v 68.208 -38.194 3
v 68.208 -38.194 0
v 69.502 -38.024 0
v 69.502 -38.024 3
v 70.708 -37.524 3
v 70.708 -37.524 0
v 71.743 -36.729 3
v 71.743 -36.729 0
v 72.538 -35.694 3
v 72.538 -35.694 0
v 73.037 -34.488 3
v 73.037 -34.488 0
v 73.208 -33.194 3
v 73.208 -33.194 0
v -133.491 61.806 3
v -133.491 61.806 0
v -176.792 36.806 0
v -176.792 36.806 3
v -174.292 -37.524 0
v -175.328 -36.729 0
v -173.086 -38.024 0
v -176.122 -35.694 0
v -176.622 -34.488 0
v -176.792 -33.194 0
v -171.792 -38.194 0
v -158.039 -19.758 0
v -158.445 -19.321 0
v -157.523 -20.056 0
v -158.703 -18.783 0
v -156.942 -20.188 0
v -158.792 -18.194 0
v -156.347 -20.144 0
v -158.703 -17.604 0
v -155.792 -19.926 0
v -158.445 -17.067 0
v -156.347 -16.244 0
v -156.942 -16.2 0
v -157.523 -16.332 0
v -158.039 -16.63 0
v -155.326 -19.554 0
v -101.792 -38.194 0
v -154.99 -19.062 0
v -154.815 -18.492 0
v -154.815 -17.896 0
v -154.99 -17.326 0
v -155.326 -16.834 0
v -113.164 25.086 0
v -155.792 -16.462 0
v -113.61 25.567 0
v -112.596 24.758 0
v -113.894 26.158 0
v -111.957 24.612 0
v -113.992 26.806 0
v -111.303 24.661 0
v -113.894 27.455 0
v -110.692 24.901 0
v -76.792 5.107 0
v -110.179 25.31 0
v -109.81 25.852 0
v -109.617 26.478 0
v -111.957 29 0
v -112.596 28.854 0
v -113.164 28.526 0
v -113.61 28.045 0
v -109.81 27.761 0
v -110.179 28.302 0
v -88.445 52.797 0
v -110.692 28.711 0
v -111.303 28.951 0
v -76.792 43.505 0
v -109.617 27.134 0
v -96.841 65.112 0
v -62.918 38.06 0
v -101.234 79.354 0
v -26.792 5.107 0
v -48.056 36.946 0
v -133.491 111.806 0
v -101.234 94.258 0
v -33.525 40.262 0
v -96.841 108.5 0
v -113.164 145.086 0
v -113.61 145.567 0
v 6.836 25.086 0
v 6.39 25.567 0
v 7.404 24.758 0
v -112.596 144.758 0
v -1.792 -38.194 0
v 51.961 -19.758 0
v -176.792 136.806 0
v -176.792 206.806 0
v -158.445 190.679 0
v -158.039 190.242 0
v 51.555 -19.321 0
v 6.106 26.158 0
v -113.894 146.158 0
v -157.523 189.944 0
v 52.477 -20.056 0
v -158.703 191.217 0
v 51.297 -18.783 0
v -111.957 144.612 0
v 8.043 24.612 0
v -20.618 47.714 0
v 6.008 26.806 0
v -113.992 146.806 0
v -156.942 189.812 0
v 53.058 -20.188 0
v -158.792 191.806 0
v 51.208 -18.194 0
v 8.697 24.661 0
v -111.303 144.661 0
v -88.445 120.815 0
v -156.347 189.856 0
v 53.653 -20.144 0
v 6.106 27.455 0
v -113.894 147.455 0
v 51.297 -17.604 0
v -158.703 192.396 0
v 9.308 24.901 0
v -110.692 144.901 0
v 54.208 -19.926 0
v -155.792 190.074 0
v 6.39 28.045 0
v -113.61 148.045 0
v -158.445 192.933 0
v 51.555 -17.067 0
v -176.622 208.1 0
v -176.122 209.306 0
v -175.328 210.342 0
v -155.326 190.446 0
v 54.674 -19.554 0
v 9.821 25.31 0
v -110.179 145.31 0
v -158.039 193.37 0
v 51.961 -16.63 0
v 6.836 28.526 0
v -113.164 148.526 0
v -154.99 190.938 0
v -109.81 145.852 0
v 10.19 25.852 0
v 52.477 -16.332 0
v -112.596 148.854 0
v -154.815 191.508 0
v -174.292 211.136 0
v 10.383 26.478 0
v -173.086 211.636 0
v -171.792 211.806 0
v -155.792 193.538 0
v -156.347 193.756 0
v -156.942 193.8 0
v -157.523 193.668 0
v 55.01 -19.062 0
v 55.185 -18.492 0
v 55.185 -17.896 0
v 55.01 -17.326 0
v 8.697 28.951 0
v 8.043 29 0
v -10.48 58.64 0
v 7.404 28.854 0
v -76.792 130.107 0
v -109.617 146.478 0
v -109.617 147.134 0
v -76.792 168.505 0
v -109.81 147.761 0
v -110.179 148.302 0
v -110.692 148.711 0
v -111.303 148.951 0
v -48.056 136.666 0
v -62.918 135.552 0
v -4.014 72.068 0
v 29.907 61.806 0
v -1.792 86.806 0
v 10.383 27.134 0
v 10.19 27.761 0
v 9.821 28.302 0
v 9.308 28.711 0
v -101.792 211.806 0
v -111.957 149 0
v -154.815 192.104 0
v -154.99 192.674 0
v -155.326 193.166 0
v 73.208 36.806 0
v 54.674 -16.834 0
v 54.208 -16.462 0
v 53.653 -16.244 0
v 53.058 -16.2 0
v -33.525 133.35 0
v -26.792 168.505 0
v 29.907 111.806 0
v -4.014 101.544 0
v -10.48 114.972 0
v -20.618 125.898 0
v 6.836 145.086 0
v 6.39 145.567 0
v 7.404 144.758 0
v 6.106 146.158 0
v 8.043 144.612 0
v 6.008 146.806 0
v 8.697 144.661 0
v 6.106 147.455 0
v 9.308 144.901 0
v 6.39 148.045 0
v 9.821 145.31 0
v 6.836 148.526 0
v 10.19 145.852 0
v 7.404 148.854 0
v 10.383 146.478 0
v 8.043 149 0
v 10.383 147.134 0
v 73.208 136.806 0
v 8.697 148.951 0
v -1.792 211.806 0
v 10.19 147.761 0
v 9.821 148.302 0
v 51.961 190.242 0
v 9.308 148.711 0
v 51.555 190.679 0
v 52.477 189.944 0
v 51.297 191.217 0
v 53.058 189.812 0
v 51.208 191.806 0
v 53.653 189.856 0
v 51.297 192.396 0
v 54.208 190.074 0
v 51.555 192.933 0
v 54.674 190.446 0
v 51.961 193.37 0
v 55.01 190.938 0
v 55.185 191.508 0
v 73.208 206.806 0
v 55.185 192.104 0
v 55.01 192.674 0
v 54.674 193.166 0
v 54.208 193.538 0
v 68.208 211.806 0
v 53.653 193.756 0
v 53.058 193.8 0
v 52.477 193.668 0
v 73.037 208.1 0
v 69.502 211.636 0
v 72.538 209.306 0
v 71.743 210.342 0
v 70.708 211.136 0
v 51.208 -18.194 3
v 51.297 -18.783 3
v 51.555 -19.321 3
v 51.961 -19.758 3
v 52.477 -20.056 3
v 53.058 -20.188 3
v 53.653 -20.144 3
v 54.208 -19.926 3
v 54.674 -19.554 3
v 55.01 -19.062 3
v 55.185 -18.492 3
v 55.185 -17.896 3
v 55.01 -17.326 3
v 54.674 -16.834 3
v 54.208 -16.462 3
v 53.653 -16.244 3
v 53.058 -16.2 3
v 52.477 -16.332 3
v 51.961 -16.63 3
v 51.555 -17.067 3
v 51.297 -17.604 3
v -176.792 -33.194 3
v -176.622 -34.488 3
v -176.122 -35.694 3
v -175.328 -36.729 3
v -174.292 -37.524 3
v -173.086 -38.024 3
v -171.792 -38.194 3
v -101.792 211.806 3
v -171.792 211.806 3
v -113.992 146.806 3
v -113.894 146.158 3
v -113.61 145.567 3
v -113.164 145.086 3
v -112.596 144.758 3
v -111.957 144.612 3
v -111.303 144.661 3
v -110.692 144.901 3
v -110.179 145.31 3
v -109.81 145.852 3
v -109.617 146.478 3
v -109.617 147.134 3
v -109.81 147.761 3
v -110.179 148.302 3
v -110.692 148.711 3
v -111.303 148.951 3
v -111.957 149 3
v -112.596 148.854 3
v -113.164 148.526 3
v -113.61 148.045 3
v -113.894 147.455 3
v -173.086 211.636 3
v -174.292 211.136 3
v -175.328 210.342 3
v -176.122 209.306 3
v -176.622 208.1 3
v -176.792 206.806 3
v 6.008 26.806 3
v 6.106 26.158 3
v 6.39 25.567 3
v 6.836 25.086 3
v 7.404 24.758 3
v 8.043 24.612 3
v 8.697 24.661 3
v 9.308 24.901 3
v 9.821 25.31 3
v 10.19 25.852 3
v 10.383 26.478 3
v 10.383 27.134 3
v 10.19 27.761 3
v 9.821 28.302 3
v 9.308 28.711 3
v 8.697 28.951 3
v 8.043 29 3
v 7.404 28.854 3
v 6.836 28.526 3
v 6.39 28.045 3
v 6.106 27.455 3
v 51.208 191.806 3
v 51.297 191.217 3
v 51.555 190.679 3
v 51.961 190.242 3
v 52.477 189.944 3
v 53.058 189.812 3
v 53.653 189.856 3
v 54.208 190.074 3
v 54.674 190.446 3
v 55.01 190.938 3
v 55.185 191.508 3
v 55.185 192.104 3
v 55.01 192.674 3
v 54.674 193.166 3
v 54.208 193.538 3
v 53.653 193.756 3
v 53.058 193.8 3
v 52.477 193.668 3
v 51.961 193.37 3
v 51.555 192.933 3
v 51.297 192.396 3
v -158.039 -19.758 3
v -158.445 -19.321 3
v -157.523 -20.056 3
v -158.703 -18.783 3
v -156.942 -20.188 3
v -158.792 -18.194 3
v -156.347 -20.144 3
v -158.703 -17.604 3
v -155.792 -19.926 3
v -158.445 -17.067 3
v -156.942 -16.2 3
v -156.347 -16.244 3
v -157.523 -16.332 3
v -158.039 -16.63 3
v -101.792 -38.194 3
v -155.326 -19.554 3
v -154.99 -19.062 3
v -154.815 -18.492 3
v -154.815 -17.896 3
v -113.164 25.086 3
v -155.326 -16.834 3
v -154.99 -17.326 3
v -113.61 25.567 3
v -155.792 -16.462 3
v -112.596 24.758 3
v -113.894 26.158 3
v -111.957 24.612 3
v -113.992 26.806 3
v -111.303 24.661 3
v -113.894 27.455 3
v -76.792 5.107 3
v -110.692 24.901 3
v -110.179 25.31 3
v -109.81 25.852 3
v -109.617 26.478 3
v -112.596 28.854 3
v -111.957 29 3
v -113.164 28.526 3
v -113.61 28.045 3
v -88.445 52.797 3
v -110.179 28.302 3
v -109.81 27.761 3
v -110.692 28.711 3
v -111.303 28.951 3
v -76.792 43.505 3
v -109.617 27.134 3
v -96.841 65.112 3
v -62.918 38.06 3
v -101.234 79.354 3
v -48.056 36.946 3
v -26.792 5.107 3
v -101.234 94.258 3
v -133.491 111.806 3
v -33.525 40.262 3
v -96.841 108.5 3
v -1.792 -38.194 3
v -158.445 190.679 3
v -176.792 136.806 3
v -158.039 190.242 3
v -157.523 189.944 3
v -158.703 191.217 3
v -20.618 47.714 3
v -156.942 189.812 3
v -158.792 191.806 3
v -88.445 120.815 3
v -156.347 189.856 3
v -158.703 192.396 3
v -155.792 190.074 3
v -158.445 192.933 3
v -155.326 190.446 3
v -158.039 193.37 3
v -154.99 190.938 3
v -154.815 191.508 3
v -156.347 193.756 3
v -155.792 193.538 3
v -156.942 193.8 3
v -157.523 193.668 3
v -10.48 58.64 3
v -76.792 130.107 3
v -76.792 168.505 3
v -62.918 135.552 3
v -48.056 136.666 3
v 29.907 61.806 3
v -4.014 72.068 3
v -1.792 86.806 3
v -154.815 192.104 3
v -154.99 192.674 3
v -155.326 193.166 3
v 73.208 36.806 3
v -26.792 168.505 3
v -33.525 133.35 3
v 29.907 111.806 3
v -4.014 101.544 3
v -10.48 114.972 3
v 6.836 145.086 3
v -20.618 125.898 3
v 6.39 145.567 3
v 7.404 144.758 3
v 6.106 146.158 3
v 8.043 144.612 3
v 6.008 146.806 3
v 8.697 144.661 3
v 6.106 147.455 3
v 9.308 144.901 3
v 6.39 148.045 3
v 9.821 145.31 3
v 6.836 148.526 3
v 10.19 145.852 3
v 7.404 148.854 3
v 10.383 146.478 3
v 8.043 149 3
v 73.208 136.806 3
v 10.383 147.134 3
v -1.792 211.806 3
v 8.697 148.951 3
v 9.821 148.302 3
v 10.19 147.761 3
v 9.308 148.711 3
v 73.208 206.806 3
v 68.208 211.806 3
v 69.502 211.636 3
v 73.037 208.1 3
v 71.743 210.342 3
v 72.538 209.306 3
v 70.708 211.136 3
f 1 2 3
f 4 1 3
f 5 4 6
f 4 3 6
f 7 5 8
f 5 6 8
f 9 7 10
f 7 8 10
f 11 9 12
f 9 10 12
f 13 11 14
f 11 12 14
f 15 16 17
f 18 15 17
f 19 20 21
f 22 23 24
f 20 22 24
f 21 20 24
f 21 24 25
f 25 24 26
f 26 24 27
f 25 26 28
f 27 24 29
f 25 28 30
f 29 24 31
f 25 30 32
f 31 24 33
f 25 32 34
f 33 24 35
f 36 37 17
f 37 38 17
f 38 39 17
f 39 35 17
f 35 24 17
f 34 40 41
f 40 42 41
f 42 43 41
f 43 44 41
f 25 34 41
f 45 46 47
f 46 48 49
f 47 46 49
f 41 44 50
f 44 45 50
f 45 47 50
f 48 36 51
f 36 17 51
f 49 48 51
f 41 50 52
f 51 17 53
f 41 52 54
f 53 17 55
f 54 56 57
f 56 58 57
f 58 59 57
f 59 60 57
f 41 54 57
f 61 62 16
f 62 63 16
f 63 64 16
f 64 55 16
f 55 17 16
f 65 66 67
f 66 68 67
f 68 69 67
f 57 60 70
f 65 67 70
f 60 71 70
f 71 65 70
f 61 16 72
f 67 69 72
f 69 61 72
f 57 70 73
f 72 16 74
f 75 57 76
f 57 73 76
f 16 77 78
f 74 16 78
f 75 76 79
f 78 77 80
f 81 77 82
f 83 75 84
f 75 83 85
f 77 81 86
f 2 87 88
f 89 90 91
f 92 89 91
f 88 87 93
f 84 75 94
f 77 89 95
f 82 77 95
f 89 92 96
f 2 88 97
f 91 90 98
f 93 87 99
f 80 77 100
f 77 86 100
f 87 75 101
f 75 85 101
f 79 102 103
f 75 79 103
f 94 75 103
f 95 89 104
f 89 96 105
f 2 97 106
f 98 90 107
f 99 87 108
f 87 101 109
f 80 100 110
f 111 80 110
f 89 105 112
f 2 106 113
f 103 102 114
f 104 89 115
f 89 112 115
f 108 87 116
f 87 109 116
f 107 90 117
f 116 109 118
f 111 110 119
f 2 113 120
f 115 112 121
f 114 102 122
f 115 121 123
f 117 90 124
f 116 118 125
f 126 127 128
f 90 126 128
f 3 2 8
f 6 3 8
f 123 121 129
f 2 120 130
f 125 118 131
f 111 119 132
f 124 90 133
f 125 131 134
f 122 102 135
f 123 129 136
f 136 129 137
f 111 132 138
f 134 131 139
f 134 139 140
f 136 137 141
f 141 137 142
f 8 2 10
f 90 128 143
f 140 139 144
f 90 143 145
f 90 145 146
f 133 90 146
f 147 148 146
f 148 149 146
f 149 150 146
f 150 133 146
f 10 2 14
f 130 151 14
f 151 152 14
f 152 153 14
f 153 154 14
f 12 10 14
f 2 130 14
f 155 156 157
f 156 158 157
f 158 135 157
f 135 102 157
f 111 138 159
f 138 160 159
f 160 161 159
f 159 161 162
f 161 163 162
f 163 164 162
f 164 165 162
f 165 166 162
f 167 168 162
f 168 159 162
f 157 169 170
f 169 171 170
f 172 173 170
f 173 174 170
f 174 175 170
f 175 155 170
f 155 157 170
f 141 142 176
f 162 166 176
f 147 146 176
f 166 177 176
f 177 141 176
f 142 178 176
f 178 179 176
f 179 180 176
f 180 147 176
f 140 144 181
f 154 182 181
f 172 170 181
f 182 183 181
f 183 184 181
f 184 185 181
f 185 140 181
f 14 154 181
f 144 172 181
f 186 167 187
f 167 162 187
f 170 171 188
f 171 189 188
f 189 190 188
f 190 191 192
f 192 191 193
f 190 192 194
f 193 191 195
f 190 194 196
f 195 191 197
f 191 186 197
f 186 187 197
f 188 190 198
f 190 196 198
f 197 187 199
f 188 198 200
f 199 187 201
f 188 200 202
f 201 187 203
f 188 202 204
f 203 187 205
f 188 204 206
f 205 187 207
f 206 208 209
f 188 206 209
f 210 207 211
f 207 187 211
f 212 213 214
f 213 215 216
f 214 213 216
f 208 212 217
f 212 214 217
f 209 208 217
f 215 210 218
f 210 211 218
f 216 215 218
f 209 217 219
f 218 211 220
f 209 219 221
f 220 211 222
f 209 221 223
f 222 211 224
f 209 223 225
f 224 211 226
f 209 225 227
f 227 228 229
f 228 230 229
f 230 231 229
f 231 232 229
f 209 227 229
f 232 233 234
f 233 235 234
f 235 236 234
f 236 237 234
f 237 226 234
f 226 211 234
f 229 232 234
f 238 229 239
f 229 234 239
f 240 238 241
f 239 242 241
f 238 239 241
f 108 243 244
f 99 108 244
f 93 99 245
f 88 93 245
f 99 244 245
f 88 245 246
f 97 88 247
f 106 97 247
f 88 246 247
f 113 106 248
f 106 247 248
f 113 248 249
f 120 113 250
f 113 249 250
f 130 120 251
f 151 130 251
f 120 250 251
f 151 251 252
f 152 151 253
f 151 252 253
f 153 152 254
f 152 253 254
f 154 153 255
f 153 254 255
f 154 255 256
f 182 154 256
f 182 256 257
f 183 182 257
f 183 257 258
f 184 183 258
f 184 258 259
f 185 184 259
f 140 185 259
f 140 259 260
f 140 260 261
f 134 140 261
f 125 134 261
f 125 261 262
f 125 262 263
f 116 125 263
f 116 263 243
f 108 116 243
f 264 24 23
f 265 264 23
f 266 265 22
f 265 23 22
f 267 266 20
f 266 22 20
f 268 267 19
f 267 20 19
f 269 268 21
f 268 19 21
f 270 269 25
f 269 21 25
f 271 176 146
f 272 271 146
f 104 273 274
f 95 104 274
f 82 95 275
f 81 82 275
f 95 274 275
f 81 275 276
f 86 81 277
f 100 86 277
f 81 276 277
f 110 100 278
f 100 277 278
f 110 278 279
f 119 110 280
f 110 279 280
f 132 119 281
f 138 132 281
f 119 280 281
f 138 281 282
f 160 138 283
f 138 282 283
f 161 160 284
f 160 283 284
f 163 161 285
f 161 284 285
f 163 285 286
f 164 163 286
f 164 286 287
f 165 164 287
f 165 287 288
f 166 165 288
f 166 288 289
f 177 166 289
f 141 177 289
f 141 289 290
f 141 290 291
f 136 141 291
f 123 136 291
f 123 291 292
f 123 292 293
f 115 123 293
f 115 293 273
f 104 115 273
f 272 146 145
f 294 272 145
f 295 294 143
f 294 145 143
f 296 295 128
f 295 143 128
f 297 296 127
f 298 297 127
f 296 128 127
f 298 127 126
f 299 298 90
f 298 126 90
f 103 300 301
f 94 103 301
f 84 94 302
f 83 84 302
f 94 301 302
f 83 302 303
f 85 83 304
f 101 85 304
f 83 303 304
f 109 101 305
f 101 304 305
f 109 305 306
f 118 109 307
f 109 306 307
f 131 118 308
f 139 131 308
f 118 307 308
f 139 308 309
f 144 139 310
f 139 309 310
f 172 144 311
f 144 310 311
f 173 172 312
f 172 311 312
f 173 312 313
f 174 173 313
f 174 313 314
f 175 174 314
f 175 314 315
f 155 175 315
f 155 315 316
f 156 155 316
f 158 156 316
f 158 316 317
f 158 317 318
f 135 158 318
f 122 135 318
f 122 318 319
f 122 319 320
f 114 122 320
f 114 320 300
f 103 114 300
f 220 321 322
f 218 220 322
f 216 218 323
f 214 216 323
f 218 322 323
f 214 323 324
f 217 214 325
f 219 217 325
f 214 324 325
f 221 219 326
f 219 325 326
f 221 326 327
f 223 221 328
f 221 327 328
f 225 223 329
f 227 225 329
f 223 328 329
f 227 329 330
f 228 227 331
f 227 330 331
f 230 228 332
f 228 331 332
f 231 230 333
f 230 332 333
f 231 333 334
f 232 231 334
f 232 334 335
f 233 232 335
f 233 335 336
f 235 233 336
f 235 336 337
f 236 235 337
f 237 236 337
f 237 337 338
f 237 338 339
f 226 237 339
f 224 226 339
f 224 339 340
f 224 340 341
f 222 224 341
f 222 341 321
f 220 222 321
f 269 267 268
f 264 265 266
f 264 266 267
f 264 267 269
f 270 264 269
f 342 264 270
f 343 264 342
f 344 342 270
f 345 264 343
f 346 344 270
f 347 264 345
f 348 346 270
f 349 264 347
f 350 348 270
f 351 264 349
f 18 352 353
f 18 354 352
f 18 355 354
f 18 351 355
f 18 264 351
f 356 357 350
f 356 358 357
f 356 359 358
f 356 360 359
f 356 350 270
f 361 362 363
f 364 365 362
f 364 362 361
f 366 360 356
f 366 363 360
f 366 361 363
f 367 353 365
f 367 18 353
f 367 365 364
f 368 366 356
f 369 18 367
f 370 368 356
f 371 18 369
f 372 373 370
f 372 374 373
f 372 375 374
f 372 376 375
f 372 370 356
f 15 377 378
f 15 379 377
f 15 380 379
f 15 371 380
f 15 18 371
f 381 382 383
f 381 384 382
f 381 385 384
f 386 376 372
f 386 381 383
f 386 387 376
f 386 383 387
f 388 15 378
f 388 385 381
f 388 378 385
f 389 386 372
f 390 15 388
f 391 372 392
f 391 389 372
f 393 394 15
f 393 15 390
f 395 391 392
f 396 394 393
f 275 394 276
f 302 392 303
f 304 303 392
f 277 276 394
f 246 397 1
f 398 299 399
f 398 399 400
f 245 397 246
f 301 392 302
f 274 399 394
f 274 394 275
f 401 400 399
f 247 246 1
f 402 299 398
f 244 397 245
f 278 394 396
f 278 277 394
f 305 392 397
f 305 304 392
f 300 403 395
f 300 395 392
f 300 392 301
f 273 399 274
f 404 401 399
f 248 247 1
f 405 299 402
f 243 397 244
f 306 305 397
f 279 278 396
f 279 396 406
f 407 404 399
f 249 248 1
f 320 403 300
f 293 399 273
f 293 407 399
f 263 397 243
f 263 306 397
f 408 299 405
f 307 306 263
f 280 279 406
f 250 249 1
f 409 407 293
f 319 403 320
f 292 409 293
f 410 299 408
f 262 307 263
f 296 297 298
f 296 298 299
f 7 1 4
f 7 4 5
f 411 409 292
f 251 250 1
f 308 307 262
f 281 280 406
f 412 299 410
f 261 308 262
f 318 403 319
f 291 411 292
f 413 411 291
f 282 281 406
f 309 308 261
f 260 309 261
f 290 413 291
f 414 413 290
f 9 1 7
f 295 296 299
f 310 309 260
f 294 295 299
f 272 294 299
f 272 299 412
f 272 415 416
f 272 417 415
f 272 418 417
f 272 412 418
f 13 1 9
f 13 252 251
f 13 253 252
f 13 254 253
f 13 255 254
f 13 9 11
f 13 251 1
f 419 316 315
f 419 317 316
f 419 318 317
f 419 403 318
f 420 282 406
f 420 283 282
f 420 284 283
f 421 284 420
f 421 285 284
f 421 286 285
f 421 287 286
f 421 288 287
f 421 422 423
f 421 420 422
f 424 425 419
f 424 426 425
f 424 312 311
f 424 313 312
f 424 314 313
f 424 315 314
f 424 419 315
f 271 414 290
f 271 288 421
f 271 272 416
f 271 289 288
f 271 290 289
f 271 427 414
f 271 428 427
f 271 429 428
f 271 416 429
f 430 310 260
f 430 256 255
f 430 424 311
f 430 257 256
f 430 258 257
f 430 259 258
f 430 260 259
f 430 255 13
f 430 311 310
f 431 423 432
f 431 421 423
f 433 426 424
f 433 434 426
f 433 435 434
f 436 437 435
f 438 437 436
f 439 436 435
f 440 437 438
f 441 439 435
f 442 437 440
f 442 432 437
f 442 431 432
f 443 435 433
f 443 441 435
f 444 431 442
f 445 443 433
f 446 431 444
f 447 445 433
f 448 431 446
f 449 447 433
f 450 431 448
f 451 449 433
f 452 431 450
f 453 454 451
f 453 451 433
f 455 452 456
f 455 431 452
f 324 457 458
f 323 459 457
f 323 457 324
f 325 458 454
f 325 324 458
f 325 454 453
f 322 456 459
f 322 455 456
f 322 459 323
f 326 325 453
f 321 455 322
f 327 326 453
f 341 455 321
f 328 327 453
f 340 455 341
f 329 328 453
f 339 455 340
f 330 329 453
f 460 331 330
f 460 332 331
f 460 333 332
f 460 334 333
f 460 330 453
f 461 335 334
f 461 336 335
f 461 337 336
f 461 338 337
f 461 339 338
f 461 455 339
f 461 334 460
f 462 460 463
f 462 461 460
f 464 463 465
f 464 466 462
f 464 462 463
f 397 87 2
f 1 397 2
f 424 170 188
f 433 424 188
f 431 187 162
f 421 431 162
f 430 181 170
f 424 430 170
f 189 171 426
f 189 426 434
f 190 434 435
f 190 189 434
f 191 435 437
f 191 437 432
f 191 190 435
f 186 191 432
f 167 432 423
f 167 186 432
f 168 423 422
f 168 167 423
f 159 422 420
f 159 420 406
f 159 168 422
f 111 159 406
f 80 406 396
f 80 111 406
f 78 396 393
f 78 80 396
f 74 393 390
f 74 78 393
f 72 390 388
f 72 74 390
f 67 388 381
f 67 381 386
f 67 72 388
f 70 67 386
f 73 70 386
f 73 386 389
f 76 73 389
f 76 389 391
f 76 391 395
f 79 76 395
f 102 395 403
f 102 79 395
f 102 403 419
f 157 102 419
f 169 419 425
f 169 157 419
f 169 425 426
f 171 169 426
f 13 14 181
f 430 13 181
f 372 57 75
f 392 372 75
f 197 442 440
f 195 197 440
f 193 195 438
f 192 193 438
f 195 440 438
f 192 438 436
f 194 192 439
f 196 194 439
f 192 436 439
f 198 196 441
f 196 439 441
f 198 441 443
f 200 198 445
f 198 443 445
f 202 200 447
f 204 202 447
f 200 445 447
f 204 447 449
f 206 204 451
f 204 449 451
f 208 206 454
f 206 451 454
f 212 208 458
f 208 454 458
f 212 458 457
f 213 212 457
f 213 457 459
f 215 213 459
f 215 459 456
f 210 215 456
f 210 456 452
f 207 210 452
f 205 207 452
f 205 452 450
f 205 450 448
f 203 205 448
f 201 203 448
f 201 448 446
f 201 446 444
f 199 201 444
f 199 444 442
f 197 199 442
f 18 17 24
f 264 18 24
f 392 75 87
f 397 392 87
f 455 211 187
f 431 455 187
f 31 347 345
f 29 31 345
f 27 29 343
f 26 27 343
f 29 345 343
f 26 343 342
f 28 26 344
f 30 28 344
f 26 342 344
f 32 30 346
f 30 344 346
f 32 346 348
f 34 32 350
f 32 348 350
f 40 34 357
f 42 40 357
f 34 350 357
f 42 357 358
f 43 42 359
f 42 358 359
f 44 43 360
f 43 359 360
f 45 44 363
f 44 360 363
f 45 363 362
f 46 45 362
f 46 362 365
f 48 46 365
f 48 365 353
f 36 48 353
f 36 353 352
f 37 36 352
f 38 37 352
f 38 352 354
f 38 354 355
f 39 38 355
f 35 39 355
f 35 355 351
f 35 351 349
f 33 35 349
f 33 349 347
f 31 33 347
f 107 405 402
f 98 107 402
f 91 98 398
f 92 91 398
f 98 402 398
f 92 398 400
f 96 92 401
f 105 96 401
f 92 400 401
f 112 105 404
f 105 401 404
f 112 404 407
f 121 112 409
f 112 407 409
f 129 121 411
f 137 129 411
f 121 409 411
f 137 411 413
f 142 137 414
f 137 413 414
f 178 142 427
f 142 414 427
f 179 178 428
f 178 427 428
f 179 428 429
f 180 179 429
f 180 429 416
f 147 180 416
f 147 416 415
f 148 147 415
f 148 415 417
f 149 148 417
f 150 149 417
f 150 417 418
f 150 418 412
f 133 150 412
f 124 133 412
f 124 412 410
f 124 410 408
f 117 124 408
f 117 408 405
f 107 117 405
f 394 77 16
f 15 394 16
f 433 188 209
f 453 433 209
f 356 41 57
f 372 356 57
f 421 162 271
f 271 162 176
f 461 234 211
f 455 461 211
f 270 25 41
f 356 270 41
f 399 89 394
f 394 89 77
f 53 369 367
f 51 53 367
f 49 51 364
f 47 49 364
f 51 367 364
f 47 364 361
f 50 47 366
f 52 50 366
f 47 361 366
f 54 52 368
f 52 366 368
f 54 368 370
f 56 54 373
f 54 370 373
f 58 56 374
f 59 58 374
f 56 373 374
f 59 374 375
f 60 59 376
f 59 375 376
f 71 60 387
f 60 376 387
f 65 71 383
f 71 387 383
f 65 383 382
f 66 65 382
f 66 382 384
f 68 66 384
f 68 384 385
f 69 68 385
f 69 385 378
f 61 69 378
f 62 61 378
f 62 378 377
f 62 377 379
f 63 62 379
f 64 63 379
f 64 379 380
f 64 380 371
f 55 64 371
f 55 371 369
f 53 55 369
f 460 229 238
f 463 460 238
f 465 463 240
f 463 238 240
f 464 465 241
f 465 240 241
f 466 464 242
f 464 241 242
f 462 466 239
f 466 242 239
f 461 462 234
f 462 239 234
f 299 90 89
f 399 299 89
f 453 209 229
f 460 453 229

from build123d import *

# Parameters (mm, degrees)
F0_R     = 50
F1_DEPTH = 3
F2_D     = 4.4
F3_D     = 4


with BuildPart() as f1:
    # F0 (on Top) → F1 (new body)
    with BuildSketch(Plane.XY):
        with BuildLine():
            Line((-101.7921956682, 211.8060733306), (-171.7921956682, 211.8060733306))
            ThreePointArc((-171.7921956682, 211.8060733306), (-175.3277295741, 210.3416072366), (-176.7921956682, 206.8060733306))
            Line((-176.7921956682, 206.8060733306), (-176.7921956682, 136.8060733306))
            Line((-176.7921956682, 136.8060733306), (-133.490925479, 111.8060733306))
            Line((-133.490925479, 111.8060733306), (-133.490925479, 61.8060733306))
            Line((-133.490925479, 61.8060733306), (-176.7921956682, 36.8060733306))
            Line((-176.7921956682, 36.8060733306), (-176.7921956682, -33.1939266694))
            ThreePointArc((-176.7921956682, -33.1939266694), (-175.3277295741, -36.7294605753), (-171.7921956682, -38.1939266694))
            Line((-171.7921956682, -38.1939266694), (-101.7921956682, -38.1939266694))
            Line((-101.7921956682, -38.1939266694), (-76.7921956682, 5.1073435198))
            Line((-76.7921956682, 5.1073435198), (-26.7921956682, 5.1073435198))
            Line((-26.7921956682, 5.1073435198), (-1.7921956682, -38.1939266694))
            Line((-1.7921956682, -38.1939266694), (68.2078043318, -38.1939266694))
            ThreePointArc((68.2078043318, -38.1939266694), (71.7433382377, -36.7294605753), (73.2078043318, -33.1939266694))
            Line((73.2078043318, -33.1939266694), (73.2078043318, 36.8060733306))
            Line((73.2078043318, 36.8060733306), (29.9065341426, 61.8060733306))
            Line((29.9065341426, 61.8060733306), (29.9065341426, 111.8060733306))
            Line((29.9065341426, 111.8060733306), (73.2078043318, 136.8060733306))
            Line((73.2078043318, 136.8060733306), (73.2078043318, 206.8060733306))
            ThreePointArc((73.2078043318, 206.8060733306), (71.7433382377, 210.3416072366), (68.2078043318, 211.8060733306))
            Line((68.2078043318, 211.8060733306), (-1.7921956682, 211.8060733306))
            Line((-1.7921956682, 211.8060733306), (-26.7921956682, 168.5048031414))
            Line((-26.7921956682, 168.5048031414), (-76.7921956682, 168.5048031414))
            Line((-76.7921956682, 168.5048031414), (-101.7921956682, 211.8060733306))
        make_face()
        with Locations((-51.7921956682, 86.8060733306)):
            Circle(F0_R, mode=Mode.SUBTRACT)
    extrude(amount=F1_DEPTH)

    # F2 (through all)
    with Locations(Plane(origin=(0, 0, 0), x_dir=(1, 0, 0), z_dir=(0, 0, -1))):
        with Locations((-111.7921956682, -146.8060733306), (-111.7921956682, -26.8060733306), (8.2078043318, -26.8060733306), (8.2078043318, -146.8060733306)):
            Hole(F2_D / 2)

    # F3 (through all)
    with Locations(Plane(origin=(0, 0, 0), x_dir=(1, 0, 0), z_dir=(0, 0, -1))):
        with Locations((-156.7921956682, -191.8060733306), (-156.7921956682, 18.1939266694), (53.2078043318, 18.1939266694), (53.2078043318, -191.8060733306)):
            Hole(F3_D / 2)


solid = f1.part
